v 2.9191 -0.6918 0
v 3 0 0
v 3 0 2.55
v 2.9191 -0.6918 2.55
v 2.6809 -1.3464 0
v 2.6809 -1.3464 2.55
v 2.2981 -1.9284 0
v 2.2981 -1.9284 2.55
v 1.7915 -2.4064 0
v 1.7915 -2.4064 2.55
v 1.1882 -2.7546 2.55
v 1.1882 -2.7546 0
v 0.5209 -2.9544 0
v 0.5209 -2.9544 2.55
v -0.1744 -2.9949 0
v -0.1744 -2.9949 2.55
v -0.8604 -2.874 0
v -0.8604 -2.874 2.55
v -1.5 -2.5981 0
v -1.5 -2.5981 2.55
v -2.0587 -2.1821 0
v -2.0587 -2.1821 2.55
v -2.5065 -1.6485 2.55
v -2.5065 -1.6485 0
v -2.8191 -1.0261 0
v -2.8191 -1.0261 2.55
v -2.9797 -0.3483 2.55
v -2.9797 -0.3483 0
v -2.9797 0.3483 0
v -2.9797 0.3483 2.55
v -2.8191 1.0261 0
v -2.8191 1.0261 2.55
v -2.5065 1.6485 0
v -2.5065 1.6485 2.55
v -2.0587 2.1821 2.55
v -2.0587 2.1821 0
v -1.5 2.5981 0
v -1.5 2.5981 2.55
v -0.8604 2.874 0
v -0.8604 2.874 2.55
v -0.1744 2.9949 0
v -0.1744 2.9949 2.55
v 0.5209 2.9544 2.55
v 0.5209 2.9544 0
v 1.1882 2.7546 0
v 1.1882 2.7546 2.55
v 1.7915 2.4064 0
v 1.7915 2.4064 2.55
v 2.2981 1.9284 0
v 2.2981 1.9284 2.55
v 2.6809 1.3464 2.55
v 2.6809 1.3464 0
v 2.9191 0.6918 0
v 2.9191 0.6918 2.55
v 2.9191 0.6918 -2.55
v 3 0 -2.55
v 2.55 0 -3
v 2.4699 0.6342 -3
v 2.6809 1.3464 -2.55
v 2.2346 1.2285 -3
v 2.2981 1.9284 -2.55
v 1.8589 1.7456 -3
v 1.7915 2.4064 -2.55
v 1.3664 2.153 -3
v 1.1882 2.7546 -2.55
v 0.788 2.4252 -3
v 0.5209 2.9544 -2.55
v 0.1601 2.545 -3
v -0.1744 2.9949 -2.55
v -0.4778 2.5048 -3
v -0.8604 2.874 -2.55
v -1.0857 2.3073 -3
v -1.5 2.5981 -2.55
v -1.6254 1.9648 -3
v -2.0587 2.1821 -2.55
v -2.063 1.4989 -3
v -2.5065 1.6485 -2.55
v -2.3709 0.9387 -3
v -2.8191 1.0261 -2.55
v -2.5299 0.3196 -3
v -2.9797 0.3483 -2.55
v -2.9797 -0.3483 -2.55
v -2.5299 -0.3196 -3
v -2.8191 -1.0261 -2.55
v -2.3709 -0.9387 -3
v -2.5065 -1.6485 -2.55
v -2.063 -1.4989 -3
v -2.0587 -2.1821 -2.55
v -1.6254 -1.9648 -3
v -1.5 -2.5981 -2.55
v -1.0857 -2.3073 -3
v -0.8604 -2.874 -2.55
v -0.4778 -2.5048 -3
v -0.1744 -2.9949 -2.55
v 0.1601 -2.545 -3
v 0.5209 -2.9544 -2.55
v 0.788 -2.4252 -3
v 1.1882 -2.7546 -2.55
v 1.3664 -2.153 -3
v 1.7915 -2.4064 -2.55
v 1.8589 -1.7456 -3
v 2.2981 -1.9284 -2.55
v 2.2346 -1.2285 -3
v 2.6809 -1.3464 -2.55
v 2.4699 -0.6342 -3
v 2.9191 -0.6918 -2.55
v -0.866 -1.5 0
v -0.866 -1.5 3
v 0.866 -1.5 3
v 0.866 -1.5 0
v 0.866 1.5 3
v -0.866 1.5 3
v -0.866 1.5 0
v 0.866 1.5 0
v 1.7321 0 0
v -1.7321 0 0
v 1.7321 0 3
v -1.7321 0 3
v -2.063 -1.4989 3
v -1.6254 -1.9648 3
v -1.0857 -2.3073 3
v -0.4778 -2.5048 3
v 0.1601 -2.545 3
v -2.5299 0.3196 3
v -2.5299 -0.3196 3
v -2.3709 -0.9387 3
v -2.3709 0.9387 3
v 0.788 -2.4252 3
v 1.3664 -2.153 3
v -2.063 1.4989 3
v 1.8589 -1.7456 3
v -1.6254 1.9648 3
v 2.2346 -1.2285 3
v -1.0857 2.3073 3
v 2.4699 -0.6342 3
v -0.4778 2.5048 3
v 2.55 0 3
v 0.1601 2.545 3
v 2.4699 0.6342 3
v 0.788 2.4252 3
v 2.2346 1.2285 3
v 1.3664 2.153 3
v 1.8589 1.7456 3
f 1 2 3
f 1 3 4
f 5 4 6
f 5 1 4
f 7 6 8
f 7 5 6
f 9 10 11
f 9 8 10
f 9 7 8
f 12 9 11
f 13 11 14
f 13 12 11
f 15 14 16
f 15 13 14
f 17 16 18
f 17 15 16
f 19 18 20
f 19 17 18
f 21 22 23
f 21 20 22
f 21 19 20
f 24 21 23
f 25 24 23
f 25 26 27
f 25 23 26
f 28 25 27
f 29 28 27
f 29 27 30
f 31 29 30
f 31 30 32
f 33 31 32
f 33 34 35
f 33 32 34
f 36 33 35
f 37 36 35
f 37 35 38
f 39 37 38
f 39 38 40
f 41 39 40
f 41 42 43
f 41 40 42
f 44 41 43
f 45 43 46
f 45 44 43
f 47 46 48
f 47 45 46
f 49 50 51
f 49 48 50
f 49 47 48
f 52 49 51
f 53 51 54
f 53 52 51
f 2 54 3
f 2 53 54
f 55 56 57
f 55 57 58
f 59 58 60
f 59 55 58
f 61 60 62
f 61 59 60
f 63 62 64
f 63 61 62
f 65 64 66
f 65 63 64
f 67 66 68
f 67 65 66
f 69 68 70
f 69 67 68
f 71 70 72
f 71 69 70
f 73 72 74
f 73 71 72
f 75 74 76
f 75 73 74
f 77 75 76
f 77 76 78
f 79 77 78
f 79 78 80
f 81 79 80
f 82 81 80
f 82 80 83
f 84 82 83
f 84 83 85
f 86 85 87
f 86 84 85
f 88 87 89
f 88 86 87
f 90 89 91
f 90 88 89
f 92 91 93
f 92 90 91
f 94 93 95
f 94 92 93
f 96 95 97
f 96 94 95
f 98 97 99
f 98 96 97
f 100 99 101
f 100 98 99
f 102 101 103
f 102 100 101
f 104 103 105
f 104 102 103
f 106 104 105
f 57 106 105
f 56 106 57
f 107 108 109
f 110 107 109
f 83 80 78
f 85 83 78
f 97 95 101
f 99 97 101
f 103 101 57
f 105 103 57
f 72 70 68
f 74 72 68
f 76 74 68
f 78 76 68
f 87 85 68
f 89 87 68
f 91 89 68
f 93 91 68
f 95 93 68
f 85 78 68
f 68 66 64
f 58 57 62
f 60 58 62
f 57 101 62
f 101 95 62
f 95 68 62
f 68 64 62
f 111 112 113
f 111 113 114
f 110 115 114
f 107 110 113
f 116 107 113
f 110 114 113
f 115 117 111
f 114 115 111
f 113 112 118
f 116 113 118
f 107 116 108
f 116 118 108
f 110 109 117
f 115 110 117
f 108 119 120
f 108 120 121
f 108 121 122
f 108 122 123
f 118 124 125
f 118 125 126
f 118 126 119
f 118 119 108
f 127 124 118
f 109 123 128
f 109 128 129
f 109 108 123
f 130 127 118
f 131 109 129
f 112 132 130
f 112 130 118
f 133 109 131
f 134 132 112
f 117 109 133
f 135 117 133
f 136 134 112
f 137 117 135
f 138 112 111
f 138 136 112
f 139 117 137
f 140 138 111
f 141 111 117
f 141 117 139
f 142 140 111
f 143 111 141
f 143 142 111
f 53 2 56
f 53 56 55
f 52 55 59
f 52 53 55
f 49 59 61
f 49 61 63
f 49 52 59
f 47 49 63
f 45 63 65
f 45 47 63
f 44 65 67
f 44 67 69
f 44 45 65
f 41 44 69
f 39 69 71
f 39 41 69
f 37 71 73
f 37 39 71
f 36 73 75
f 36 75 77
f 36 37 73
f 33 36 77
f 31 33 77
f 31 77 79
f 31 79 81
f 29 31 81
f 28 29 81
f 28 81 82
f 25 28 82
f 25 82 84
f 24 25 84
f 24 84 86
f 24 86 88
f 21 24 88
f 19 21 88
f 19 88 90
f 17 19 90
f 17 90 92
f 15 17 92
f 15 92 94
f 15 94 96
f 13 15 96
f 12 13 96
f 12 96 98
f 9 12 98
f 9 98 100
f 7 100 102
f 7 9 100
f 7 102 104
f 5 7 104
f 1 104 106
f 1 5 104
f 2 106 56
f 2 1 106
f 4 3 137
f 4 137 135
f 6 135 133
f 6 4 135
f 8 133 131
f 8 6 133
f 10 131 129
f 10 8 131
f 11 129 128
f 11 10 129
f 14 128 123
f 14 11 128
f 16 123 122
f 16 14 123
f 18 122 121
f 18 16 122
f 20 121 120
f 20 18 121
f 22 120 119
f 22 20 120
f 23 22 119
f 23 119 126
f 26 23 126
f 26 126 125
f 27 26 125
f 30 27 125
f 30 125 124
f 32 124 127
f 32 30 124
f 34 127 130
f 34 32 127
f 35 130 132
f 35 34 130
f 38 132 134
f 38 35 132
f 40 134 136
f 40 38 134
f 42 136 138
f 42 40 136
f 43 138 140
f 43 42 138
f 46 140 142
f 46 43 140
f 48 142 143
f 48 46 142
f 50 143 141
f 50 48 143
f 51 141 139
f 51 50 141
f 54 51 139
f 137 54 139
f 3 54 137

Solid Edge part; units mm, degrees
sketch "Sketch1" plane through (0, 0, 0) normal (0, 0, 1) x (1, 0, 0)
  circle A0 centre (0, 0) radius 3
  dimension "D1" = 6
extrude "Protrusion1" add sketch "Sketch1" along normal mid plane 6
chamfer "Chamfer1" distance 0.45 angle 45 2 edges at (-3, 0, -3) (-3, 0, 3)
sketch "Sketch2" plane through (0, 0, 3) normal (0, 0, 1) x (1, 0, 0)
  line L0 (-0.866, 1.5) -> (0.866, 1.5)
  line L1 (1.7321, 0) -> (0.866, 1.5)
  line L2 (0.866, -1.5) -> (1.7321, 0)
  line L3 (-0.866, -1.5) -> (0.866, -1.5)
  line L4 (-1.7321, 0) -> (-0.866, -1.5)
  line L5 (-0.866, 1.5) -> (-1.7321, 0)
  dimension "D1" = 3
extrude "Cutout1" cut sketch "Sketch2" against normal blind 3
properties part number "24104557"
